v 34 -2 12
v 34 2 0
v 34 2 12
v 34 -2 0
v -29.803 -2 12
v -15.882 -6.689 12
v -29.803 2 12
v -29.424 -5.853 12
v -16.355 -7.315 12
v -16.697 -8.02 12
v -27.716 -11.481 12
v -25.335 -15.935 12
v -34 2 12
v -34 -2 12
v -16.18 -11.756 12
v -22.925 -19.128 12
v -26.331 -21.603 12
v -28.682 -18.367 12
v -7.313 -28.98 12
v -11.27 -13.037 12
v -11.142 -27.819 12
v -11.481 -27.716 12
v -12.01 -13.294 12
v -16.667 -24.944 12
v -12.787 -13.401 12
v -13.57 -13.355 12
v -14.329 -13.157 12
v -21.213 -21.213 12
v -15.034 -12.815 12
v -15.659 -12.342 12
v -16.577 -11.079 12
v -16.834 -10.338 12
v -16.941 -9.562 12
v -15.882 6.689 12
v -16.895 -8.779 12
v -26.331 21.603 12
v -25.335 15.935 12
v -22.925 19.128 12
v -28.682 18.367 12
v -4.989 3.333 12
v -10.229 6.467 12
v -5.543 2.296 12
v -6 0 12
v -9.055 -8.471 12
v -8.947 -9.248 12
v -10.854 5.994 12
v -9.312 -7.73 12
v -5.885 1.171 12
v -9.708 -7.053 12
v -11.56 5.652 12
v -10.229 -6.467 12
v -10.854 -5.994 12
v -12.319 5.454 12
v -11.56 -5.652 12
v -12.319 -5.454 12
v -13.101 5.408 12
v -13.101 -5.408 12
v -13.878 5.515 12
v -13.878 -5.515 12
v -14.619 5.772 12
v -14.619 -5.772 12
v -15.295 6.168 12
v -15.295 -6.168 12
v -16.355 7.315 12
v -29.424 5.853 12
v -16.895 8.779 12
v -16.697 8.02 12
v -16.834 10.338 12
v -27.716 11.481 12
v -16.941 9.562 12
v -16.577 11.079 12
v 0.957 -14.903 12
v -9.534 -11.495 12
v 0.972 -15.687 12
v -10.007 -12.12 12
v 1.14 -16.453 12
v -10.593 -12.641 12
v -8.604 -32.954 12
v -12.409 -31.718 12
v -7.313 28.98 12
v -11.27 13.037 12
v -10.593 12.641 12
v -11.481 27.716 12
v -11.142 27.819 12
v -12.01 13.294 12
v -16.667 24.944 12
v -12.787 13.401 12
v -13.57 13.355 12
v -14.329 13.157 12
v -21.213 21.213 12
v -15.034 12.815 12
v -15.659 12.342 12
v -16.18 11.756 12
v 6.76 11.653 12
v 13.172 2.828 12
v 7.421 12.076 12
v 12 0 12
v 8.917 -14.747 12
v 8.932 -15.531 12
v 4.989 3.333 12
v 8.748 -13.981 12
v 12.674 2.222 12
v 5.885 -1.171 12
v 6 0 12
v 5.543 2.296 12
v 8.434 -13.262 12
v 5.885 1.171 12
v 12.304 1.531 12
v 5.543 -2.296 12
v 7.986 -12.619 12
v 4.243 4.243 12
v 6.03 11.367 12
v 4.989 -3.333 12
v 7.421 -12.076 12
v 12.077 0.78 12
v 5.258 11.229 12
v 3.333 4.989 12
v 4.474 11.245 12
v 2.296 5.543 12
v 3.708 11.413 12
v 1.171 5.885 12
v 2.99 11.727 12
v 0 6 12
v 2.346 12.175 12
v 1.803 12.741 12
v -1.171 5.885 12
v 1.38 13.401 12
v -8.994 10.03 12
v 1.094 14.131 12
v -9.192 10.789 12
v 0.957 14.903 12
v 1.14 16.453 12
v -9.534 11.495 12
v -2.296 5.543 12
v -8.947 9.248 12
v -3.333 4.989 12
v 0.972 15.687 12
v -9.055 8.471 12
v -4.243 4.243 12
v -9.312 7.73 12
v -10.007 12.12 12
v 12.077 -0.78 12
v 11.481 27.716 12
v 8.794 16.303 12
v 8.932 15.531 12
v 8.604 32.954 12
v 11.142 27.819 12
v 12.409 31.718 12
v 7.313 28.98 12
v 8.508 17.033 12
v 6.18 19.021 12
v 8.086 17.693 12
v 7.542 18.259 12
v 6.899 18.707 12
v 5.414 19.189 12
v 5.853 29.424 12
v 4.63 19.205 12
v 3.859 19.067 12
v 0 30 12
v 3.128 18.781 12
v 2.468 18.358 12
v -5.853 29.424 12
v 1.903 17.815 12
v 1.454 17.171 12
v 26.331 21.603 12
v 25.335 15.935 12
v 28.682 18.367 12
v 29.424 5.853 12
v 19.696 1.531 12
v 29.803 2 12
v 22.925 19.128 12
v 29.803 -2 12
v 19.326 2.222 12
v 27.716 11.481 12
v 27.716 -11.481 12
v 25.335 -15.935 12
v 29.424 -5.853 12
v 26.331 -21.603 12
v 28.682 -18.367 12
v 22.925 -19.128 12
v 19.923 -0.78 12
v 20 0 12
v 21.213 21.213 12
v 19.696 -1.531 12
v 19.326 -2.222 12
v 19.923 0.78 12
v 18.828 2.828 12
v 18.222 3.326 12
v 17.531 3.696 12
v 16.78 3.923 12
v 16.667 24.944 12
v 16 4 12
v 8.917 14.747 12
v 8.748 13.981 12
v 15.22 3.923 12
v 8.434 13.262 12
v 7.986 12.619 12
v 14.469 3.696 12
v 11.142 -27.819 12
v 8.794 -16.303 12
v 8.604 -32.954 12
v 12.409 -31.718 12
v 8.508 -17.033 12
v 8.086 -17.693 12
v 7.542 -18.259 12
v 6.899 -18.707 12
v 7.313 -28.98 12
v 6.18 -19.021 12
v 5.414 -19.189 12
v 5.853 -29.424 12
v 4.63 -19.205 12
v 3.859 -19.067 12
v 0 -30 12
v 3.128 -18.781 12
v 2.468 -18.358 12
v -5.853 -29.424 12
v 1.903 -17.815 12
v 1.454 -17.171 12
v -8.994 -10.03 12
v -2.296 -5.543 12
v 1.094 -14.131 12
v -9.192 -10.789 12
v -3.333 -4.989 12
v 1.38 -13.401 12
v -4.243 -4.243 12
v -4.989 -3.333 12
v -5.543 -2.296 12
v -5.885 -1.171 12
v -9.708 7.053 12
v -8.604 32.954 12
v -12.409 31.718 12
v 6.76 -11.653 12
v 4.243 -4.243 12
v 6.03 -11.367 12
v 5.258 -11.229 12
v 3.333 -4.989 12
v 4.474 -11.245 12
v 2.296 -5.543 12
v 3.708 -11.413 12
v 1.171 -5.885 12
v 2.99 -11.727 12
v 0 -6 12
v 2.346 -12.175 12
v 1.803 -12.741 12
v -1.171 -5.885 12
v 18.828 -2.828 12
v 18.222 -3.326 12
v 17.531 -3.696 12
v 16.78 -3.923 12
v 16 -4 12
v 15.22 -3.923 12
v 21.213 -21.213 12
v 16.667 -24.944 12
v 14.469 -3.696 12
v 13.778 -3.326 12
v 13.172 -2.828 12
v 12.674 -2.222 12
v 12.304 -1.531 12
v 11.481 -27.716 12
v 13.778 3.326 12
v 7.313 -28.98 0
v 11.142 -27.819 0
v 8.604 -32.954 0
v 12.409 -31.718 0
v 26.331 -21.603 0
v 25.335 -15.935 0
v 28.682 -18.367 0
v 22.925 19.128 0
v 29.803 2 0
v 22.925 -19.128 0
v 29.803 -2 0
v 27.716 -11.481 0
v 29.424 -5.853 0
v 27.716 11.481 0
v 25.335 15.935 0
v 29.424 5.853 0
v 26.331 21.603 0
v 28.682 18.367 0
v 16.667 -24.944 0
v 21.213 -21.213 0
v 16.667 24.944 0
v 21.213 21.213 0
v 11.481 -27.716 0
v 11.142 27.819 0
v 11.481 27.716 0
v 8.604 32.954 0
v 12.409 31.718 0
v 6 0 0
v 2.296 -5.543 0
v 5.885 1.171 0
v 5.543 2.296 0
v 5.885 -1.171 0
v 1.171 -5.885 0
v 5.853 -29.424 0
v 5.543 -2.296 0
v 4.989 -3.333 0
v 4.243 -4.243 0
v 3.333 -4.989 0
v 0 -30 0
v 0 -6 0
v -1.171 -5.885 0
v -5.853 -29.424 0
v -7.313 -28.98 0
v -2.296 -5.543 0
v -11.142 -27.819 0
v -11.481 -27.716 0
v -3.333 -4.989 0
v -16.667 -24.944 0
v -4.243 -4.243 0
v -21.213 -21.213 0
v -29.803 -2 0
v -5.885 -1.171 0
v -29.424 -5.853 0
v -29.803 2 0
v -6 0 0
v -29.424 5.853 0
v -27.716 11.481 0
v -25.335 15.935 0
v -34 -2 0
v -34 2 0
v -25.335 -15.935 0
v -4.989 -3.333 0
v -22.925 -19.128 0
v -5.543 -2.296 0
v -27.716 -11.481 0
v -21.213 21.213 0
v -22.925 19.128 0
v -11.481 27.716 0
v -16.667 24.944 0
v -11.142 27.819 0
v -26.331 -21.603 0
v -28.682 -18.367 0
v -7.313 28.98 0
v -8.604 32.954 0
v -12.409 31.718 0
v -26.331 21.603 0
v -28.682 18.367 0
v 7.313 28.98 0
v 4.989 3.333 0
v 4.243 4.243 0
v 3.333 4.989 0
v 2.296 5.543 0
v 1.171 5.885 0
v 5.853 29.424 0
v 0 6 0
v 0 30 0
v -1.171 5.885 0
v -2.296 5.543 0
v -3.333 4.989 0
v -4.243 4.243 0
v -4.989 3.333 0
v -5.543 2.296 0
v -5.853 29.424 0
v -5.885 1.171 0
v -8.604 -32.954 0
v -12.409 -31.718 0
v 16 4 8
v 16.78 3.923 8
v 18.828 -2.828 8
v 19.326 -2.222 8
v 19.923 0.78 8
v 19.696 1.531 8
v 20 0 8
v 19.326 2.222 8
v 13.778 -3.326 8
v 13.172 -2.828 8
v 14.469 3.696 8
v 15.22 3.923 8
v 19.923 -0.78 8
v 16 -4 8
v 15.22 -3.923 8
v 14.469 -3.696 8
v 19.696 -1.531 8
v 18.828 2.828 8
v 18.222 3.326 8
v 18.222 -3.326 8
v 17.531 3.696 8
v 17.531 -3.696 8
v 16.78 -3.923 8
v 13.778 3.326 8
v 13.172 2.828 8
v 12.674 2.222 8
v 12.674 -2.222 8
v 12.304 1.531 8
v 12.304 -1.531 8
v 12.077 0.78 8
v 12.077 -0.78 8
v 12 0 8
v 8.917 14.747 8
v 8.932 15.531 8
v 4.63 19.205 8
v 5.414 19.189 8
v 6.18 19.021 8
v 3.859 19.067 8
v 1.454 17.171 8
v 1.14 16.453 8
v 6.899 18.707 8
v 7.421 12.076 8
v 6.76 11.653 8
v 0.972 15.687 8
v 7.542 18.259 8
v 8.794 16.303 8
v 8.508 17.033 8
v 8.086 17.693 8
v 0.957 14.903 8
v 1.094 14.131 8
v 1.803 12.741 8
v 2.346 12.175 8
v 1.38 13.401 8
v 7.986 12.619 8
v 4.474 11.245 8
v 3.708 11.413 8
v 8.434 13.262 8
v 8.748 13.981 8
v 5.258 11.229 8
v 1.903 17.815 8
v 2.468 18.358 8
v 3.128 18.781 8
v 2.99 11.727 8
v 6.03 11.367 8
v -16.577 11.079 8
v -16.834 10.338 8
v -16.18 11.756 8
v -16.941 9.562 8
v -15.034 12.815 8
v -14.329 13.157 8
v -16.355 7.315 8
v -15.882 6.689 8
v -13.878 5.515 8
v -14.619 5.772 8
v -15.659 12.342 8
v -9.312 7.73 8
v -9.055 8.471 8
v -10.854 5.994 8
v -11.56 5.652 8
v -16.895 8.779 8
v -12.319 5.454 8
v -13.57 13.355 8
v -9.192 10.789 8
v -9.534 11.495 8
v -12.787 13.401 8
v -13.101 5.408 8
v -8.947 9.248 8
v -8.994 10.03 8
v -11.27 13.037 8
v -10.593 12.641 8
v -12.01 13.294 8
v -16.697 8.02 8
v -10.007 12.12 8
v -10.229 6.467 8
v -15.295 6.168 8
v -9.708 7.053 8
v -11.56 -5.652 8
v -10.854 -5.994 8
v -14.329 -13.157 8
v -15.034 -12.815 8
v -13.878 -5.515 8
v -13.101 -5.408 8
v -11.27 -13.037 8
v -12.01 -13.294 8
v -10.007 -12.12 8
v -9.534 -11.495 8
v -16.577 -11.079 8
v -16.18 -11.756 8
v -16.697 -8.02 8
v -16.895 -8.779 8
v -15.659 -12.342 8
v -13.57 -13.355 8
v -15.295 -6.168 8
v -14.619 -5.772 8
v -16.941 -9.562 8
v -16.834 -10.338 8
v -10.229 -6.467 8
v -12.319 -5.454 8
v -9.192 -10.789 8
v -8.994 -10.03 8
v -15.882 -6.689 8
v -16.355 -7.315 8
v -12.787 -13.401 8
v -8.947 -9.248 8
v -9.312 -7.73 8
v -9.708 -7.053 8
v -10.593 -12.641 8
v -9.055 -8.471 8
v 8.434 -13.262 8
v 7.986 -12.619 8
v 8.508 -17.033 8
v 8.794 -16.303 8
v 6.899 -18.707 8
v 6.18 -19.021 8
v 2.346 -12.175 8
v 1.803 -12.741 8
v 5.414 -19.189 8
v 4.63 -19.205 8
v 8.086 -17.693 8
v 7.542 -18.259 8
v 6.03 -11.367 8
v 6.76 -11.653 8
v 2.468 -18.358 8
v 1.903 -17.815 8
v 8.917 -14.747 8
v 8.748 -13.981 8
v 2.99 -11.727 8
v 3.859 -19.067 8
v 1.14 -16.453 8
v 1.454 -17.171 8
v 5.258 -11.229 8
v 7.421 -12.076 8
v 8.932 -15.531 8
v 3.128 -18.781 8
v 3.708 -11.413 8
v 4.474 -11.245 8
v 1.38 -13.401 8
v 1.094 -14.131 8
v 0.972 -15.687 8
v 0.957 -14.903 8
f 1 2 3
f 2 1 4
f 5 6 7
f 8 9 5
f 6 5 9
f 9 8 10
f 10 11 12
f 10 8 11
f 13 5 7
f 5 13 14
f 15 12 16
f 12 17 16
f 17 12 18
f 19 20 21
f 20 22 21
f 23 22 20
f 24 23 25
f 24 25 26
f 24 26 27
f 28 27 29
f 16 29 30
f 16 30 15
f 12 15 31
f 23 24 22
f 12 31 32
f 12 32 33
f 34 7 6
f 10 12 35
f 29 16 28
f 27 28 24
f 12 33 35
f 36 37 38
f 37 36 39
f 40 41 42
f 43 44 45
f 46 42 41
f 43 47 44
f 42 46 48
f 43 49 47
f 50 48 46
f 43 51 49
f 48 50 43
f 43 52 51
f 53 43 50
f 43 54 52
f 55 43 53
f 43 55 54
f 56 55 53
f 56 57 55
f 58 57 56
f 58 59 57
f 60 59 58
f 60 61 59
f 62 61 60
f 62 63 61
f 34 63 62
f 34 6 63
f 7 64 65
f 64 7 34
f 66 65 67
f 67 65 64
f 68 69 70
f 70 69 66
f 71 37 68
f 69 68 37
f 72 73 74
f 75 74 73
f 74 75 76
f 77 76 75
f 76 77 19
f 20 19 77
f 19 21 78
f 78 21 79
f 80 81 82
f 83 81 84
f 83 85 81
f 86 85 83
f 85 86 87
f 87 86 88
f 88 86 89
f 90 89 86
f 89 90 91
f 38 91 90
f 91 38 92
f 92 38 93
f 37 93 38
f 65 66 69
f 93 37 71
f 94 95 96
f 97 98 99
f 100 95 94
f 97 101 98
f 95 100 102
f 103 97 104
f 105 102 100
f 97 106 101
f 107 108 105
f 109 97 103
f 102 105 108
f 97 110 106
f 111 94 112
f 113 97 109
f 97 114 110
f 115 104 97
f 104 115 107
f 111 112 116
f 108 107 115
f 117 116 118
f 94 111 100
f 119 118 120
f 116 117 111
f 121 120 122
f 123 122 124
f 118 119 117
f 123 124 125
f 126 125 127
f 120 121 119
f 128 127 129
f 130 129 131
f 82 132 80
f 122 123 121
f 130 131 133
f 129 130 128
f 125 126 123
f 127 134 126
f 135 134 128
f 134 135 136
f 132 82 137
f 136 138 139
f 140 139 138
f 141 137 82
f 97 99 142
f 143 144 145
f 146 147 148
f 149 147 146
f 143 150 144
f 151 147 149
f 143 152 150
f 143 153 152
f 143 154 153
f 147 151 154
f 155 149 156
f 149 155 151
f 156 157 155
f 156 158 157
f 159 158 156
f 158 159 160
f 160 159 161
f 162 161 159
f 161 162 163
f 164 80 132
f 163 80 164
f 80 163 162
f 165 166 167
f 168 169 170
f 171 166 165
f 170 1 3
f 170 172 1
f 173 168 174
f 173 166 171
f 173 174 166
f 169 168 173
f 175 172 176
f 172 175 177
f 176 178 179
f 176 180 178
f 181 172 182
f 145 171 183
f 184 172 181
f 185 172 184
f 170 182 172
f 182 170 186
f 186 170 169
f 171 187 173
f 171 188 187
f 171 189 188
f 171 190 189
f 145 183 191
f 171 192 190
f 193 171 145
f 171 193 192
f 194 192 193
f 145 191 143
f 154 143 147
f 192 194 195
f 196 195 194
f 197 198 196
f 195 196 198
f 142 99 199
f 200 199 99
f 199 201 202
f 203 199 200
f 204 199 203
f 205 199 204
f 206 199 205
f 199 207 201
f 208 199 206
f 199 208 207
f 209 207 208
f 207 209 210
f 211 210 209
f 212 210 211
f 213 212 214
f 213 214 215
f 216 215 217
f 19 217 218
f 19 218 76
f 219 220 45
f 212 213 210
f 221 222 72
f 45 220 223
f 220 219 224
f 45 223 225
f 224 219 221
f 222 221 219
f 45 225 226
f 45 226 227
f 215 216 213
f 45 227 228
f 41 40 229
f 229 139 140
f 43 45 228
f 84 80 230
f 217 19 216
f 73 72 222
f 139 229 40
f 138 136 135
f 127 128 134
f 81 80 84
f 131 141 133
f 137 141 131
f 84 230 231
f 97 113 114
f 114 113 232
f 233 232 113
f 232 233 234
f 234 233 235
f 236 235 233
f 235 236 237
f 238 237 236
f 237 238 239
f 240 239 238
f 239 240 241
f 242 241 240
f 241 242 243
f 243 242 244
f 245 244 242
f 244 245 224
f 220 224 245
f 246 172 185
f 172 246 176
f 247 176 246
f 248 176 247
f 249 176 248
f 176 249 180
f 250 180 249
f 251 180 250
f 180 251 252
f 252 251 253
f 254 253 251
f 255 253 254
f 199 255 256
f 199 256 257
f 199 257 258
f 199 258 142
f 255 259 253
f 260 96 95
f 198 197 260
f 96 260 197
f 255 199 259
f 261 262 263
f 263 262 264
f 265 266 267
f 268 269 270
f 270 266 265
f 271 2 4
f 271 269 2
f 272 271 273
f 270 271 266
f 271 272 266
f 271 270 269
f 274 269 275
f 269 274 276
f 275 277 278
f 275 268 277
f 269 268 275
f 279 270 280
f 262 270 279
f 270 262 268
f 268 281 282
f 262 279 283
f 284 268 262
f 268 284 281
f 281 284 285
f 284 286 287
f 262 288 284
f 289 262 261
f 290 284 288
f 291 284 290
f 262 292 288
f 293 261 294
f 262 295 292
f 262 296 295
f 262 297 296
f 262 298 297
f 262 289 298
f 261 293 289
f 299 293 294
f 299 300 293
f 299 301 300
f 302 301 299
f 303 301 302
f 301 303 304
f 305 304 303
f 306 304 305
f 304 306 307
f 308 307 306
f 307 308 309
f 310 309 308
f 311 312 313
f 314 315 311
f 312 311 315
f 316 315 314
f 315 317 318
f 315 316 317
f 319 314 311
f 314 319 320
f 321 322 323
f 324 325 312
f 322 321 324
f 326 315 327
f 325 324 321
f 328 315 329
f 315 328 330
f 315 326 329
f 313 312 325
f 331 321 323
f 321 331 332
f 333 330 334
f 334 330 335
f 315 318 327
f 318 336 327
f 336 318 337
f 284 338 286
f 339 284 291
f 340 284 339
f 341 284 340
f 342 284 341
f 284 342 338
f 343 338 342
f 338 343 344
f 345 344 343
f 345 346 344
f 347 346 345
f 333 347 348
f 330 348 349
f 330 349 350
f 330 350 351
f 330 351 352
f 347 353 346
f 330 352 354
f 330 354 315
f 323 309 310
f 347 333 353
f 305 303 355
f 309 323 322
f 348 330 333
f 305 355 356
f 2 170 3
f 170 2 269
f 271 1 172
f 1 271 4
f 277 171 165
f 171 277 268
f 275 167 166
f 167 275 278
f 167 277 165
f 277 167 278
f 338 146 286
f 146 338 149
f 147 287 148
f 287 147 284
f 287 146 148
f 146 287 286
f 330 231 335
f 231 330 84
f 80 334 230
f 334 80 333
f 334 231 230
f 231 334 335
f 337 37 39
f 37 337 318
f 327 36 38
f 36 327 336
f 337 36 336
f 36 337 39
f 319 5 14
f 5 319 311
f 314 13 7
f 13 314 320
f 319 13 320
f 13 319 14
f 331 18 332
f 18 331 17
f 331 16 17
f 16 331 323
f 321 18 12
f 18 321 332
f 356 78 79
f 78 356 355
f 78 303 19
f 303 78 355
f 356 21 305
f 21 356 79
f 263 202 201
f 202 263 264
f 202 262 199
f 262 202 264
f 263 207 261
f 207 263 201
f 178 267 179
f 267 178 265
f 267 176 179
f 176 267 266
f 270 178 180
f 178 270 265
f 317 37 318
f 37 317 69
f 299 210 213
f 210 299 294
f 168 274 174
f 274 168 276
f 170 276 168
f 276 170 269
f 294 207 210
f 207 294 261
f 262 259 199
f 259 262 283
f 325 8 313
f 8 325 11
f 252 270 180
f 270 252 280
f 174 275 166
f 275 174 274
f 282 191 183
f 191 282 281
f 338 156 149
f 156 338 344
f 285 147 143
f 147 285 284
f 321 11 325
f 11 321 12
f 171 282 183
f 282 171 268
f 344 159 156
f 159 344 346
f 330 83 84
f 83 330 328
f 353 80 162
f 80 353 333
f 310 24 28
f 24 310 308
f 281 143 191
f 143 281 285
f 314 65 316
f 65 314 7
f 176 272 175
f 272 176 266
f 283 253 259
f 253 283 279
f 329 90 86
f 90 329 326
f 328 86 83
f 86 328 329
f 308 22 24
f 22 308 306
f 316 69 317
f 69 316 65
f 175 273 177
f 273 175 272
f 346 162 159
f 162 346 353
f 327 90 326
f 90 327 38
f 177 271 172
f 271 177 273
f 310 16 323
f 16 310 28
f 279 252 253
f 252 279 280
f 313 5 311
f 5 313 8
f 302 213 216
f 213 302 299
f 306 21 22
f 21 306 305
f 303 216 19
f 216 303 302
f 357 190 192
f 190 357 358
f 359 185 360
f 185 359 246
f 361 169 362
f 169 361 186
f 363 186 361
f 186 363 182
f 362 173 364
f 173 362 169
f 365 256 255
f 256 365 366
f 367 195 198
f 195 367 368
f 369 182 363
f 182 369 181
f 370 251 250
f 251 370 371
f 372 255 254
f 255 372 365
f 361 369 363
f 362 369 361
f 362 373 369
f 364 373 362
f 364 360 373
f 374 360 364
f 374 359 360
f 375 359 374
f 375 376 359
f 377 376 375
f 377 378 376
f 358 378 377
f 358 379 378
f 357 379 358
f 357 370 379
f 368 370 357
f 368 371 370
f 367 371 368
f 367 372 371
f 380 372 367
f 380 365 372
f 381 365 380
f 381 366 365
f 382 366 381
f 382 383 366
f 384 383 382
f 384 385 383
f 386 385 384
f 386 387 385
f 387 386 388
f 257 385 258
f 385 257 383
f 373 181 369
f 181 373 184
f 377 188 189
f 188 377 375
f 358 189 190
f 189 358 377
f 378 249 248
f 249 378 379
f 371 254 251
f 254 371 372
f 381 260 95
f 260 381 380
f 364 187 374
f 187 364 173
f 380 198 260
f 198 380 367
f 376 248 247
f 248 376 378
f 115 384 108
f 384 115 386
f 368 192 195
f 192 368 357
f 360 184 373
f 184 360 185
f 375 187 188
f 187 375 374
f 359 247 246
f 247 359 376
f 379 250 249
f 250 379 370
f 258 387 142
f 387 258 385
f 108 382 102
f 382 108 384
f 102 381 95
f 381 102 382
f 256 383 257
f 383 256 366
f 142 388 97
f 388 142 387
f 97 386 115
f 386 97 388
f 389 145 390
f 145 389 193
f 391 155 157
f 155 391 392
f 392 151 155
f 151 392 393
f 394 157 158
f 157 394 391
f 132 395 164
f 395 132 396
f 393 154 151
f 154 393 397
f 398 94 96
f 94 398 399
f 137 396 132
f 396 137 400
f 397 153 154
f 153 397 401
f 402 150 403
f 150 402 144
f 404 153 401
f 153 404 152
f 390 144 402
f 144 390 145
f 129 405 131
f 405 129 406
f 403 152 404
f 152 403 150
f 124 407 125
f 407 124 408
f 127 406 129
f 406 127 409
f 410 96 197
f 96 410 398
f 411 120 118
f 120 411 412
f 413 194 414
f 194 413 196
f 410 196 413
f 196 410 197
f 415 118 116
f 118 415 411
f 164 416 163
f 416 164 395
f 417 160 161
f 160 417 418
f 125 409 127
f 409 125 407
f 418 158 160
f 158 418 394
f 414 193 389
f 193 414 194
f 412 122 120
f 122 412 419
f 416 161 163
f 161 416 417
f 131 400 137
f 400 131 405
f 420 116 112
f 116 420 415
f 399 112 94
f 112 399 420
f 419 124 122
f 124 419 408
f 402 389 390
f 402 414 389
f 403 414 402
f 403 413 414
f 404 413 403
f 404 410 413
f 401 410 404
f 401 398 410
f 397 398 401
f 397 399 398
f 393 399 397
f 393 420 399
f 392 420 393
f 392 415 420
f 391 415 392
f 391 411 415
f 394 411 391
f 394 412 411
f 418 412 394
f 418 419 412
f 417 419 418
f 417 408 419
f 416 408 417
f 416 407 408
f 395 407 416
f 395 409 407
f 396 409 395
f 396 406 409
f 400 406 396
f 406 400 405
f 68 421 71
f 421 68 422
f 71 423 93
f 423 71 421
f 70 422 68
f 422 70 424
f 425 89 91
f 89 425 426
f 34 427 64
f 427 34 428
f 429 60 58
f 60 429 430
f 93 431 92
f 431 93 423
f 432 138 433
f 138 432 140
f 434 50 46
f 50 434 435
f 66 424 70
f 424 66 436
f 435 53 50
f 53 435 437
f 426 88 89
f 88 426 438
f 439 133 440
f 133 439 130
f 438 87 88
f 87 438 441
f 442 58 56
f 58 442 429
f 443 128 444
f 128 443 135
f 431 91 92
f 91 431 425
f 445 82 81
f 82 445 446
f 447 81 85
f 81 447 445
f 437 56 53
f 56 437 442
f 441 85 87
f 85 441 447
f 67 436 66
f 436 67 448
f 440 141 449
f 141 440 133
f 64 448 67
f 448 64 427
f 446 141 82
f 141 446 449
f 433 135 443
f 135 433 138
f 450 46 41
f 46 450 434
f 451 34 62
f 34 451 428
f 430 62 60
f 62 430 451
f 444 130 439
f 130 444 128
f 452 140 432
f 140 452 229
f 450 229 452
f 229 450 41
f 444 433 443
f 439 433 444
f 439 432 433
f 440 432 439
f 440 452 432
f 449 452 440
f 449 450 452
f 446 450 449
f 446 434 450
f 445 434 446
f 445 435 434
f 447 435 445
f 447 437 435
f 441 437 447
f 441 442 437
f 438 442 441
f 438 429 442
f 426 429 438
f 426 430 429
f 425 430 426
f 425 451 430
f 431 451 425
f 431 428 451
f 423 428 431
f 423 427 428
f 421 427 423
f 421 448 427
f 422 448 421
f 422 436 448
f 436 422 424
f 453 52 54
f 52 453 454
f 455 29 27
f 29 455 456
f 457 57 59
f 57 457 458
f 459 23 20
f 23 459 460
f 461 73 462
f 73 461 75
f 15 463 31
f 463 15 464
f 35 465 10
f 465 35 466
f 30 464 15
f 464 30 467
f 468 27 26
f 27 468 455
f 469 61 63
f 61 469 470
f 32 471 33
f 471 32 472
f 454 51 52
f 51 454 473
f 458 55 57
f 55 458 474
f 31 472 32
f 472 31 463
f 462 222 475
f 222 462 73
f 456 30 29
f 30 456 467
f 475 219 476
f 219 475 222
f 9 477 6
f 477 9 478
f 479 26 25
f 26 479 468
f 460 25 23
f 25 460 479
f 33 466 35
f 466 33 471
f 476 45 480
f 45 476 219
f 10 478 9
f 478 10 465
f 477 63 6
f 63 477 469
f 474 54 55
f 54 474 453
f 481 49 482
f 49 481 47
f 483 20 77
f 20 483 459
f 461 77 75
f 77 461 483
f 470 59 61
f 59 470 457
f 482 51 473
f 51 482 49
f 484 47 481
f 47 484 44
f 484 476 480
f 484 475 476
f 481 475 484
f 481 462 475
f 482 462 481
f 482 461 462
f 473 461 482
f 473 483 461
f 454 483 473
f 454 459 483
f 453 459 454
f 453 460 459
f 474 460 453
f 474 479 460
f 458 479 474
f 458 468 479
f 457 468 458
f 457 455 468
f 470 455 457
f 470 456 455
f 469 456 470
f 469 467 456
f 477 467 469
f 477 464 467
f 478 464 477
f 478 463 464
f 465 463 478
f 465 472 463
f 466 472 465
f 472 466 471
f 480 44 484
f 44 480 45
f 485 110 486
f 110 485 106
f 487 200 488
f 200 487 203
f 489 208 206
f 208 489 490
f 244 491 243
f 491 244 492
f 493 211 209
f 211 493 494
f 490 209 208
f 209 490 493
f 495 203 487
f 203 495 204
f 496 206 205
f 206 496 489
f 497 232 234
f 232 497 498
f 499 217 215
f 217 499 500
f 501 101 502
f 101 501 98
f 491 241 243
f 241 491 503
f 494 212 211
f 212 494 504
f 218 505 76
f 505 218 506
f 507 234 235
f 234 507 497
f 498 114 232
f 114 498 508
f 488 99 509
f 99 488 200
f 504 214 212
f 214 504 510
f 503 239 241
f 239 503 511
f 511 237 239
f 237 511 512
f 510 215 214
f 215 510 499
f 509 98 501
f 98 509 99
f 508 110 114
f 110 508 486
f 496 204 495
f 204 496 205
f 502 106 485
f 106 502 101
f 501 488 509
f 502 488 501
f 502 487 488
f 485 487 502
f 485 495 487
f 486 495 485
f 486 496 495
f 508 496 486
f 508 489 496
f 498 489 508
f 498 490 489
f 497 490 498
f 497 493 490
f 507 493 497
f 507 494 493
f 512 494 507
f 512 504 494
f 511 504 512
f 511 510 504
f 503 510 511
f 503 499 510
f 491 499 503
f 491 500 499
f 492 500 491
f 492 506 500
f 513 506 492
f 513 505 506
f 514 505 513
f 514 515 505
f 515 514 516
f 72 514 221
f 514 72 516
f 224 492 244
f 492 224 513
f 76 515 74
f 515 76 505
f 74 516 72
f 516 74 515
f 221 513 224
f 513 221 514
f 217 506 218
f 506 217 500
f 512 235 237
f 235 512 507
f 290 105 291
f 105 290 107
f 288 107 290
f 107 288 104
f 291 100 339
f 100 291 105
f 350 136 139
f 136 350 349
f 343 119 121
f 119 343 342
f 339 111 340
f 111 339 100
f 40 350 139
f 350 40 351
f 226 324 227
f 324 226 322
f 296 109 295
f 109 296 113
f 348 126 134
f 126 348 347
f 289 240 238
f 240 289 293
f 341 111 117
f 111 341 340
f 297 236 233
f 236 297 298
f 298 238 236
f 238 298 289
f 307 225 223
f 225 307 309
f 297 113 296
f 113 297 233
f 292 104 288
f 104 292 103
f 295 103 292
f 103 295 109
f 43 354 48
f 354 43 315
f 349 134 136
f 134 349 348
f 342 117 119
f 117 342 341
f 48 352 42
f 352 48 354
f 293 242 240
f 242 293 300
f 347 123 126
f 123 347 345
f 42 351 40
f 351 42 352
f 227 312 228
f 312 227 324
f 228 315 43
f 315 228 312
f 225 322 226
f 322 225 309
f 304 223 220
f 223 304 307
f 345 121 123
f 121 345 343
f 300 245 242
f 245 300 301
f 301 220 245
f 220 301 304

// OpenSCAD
$fn = 32;

// ----------------------------------------------------------------------
// Spur blank: lightened gear blank
// ----------------------------------------------------------------------

// --- parameters (mm) ---
disc_r = 30;              // blank root radius
disc_t = 12;              // blank thickness
n_teeth = 10;             // stub tooth count
tooth_w = 4;              // tooth width at the root
tooth_h = 4;              // tooth height above the root
bore_r = 6;               // central bore radius
ring_r = 16;              // lightening pocket ring radius
pocket_r = 4;             // lightening pocket radius

out_r = disc_r + tooth_h;  // tip radius
bbox_x = 68.0;  // measured width over the teeth
bbox_y = 65.91;  // measured depth over the teeth

difference() {
union() {
  cylinder(r = disc_r, h = disc_t);
  for (i = [0 : n_teeth - 1])
    rotate([0, 0, i * 360 / n_teeth])
      translate([disc_r - 1, -tooth_w / 2, 0])
        cube([tooth_h + 1, tooth_w, disc_t]);
}
  translate([0, 0, -1]) cylinder(r = bore_r, h = disc_t + 2);
  for (i = [0 : 5])
    rotate([0, 0, i * 72])
      translate([ring_r, 0, disc_t - 4])
        cylinder(r = pocket_r, h = 5);
}
